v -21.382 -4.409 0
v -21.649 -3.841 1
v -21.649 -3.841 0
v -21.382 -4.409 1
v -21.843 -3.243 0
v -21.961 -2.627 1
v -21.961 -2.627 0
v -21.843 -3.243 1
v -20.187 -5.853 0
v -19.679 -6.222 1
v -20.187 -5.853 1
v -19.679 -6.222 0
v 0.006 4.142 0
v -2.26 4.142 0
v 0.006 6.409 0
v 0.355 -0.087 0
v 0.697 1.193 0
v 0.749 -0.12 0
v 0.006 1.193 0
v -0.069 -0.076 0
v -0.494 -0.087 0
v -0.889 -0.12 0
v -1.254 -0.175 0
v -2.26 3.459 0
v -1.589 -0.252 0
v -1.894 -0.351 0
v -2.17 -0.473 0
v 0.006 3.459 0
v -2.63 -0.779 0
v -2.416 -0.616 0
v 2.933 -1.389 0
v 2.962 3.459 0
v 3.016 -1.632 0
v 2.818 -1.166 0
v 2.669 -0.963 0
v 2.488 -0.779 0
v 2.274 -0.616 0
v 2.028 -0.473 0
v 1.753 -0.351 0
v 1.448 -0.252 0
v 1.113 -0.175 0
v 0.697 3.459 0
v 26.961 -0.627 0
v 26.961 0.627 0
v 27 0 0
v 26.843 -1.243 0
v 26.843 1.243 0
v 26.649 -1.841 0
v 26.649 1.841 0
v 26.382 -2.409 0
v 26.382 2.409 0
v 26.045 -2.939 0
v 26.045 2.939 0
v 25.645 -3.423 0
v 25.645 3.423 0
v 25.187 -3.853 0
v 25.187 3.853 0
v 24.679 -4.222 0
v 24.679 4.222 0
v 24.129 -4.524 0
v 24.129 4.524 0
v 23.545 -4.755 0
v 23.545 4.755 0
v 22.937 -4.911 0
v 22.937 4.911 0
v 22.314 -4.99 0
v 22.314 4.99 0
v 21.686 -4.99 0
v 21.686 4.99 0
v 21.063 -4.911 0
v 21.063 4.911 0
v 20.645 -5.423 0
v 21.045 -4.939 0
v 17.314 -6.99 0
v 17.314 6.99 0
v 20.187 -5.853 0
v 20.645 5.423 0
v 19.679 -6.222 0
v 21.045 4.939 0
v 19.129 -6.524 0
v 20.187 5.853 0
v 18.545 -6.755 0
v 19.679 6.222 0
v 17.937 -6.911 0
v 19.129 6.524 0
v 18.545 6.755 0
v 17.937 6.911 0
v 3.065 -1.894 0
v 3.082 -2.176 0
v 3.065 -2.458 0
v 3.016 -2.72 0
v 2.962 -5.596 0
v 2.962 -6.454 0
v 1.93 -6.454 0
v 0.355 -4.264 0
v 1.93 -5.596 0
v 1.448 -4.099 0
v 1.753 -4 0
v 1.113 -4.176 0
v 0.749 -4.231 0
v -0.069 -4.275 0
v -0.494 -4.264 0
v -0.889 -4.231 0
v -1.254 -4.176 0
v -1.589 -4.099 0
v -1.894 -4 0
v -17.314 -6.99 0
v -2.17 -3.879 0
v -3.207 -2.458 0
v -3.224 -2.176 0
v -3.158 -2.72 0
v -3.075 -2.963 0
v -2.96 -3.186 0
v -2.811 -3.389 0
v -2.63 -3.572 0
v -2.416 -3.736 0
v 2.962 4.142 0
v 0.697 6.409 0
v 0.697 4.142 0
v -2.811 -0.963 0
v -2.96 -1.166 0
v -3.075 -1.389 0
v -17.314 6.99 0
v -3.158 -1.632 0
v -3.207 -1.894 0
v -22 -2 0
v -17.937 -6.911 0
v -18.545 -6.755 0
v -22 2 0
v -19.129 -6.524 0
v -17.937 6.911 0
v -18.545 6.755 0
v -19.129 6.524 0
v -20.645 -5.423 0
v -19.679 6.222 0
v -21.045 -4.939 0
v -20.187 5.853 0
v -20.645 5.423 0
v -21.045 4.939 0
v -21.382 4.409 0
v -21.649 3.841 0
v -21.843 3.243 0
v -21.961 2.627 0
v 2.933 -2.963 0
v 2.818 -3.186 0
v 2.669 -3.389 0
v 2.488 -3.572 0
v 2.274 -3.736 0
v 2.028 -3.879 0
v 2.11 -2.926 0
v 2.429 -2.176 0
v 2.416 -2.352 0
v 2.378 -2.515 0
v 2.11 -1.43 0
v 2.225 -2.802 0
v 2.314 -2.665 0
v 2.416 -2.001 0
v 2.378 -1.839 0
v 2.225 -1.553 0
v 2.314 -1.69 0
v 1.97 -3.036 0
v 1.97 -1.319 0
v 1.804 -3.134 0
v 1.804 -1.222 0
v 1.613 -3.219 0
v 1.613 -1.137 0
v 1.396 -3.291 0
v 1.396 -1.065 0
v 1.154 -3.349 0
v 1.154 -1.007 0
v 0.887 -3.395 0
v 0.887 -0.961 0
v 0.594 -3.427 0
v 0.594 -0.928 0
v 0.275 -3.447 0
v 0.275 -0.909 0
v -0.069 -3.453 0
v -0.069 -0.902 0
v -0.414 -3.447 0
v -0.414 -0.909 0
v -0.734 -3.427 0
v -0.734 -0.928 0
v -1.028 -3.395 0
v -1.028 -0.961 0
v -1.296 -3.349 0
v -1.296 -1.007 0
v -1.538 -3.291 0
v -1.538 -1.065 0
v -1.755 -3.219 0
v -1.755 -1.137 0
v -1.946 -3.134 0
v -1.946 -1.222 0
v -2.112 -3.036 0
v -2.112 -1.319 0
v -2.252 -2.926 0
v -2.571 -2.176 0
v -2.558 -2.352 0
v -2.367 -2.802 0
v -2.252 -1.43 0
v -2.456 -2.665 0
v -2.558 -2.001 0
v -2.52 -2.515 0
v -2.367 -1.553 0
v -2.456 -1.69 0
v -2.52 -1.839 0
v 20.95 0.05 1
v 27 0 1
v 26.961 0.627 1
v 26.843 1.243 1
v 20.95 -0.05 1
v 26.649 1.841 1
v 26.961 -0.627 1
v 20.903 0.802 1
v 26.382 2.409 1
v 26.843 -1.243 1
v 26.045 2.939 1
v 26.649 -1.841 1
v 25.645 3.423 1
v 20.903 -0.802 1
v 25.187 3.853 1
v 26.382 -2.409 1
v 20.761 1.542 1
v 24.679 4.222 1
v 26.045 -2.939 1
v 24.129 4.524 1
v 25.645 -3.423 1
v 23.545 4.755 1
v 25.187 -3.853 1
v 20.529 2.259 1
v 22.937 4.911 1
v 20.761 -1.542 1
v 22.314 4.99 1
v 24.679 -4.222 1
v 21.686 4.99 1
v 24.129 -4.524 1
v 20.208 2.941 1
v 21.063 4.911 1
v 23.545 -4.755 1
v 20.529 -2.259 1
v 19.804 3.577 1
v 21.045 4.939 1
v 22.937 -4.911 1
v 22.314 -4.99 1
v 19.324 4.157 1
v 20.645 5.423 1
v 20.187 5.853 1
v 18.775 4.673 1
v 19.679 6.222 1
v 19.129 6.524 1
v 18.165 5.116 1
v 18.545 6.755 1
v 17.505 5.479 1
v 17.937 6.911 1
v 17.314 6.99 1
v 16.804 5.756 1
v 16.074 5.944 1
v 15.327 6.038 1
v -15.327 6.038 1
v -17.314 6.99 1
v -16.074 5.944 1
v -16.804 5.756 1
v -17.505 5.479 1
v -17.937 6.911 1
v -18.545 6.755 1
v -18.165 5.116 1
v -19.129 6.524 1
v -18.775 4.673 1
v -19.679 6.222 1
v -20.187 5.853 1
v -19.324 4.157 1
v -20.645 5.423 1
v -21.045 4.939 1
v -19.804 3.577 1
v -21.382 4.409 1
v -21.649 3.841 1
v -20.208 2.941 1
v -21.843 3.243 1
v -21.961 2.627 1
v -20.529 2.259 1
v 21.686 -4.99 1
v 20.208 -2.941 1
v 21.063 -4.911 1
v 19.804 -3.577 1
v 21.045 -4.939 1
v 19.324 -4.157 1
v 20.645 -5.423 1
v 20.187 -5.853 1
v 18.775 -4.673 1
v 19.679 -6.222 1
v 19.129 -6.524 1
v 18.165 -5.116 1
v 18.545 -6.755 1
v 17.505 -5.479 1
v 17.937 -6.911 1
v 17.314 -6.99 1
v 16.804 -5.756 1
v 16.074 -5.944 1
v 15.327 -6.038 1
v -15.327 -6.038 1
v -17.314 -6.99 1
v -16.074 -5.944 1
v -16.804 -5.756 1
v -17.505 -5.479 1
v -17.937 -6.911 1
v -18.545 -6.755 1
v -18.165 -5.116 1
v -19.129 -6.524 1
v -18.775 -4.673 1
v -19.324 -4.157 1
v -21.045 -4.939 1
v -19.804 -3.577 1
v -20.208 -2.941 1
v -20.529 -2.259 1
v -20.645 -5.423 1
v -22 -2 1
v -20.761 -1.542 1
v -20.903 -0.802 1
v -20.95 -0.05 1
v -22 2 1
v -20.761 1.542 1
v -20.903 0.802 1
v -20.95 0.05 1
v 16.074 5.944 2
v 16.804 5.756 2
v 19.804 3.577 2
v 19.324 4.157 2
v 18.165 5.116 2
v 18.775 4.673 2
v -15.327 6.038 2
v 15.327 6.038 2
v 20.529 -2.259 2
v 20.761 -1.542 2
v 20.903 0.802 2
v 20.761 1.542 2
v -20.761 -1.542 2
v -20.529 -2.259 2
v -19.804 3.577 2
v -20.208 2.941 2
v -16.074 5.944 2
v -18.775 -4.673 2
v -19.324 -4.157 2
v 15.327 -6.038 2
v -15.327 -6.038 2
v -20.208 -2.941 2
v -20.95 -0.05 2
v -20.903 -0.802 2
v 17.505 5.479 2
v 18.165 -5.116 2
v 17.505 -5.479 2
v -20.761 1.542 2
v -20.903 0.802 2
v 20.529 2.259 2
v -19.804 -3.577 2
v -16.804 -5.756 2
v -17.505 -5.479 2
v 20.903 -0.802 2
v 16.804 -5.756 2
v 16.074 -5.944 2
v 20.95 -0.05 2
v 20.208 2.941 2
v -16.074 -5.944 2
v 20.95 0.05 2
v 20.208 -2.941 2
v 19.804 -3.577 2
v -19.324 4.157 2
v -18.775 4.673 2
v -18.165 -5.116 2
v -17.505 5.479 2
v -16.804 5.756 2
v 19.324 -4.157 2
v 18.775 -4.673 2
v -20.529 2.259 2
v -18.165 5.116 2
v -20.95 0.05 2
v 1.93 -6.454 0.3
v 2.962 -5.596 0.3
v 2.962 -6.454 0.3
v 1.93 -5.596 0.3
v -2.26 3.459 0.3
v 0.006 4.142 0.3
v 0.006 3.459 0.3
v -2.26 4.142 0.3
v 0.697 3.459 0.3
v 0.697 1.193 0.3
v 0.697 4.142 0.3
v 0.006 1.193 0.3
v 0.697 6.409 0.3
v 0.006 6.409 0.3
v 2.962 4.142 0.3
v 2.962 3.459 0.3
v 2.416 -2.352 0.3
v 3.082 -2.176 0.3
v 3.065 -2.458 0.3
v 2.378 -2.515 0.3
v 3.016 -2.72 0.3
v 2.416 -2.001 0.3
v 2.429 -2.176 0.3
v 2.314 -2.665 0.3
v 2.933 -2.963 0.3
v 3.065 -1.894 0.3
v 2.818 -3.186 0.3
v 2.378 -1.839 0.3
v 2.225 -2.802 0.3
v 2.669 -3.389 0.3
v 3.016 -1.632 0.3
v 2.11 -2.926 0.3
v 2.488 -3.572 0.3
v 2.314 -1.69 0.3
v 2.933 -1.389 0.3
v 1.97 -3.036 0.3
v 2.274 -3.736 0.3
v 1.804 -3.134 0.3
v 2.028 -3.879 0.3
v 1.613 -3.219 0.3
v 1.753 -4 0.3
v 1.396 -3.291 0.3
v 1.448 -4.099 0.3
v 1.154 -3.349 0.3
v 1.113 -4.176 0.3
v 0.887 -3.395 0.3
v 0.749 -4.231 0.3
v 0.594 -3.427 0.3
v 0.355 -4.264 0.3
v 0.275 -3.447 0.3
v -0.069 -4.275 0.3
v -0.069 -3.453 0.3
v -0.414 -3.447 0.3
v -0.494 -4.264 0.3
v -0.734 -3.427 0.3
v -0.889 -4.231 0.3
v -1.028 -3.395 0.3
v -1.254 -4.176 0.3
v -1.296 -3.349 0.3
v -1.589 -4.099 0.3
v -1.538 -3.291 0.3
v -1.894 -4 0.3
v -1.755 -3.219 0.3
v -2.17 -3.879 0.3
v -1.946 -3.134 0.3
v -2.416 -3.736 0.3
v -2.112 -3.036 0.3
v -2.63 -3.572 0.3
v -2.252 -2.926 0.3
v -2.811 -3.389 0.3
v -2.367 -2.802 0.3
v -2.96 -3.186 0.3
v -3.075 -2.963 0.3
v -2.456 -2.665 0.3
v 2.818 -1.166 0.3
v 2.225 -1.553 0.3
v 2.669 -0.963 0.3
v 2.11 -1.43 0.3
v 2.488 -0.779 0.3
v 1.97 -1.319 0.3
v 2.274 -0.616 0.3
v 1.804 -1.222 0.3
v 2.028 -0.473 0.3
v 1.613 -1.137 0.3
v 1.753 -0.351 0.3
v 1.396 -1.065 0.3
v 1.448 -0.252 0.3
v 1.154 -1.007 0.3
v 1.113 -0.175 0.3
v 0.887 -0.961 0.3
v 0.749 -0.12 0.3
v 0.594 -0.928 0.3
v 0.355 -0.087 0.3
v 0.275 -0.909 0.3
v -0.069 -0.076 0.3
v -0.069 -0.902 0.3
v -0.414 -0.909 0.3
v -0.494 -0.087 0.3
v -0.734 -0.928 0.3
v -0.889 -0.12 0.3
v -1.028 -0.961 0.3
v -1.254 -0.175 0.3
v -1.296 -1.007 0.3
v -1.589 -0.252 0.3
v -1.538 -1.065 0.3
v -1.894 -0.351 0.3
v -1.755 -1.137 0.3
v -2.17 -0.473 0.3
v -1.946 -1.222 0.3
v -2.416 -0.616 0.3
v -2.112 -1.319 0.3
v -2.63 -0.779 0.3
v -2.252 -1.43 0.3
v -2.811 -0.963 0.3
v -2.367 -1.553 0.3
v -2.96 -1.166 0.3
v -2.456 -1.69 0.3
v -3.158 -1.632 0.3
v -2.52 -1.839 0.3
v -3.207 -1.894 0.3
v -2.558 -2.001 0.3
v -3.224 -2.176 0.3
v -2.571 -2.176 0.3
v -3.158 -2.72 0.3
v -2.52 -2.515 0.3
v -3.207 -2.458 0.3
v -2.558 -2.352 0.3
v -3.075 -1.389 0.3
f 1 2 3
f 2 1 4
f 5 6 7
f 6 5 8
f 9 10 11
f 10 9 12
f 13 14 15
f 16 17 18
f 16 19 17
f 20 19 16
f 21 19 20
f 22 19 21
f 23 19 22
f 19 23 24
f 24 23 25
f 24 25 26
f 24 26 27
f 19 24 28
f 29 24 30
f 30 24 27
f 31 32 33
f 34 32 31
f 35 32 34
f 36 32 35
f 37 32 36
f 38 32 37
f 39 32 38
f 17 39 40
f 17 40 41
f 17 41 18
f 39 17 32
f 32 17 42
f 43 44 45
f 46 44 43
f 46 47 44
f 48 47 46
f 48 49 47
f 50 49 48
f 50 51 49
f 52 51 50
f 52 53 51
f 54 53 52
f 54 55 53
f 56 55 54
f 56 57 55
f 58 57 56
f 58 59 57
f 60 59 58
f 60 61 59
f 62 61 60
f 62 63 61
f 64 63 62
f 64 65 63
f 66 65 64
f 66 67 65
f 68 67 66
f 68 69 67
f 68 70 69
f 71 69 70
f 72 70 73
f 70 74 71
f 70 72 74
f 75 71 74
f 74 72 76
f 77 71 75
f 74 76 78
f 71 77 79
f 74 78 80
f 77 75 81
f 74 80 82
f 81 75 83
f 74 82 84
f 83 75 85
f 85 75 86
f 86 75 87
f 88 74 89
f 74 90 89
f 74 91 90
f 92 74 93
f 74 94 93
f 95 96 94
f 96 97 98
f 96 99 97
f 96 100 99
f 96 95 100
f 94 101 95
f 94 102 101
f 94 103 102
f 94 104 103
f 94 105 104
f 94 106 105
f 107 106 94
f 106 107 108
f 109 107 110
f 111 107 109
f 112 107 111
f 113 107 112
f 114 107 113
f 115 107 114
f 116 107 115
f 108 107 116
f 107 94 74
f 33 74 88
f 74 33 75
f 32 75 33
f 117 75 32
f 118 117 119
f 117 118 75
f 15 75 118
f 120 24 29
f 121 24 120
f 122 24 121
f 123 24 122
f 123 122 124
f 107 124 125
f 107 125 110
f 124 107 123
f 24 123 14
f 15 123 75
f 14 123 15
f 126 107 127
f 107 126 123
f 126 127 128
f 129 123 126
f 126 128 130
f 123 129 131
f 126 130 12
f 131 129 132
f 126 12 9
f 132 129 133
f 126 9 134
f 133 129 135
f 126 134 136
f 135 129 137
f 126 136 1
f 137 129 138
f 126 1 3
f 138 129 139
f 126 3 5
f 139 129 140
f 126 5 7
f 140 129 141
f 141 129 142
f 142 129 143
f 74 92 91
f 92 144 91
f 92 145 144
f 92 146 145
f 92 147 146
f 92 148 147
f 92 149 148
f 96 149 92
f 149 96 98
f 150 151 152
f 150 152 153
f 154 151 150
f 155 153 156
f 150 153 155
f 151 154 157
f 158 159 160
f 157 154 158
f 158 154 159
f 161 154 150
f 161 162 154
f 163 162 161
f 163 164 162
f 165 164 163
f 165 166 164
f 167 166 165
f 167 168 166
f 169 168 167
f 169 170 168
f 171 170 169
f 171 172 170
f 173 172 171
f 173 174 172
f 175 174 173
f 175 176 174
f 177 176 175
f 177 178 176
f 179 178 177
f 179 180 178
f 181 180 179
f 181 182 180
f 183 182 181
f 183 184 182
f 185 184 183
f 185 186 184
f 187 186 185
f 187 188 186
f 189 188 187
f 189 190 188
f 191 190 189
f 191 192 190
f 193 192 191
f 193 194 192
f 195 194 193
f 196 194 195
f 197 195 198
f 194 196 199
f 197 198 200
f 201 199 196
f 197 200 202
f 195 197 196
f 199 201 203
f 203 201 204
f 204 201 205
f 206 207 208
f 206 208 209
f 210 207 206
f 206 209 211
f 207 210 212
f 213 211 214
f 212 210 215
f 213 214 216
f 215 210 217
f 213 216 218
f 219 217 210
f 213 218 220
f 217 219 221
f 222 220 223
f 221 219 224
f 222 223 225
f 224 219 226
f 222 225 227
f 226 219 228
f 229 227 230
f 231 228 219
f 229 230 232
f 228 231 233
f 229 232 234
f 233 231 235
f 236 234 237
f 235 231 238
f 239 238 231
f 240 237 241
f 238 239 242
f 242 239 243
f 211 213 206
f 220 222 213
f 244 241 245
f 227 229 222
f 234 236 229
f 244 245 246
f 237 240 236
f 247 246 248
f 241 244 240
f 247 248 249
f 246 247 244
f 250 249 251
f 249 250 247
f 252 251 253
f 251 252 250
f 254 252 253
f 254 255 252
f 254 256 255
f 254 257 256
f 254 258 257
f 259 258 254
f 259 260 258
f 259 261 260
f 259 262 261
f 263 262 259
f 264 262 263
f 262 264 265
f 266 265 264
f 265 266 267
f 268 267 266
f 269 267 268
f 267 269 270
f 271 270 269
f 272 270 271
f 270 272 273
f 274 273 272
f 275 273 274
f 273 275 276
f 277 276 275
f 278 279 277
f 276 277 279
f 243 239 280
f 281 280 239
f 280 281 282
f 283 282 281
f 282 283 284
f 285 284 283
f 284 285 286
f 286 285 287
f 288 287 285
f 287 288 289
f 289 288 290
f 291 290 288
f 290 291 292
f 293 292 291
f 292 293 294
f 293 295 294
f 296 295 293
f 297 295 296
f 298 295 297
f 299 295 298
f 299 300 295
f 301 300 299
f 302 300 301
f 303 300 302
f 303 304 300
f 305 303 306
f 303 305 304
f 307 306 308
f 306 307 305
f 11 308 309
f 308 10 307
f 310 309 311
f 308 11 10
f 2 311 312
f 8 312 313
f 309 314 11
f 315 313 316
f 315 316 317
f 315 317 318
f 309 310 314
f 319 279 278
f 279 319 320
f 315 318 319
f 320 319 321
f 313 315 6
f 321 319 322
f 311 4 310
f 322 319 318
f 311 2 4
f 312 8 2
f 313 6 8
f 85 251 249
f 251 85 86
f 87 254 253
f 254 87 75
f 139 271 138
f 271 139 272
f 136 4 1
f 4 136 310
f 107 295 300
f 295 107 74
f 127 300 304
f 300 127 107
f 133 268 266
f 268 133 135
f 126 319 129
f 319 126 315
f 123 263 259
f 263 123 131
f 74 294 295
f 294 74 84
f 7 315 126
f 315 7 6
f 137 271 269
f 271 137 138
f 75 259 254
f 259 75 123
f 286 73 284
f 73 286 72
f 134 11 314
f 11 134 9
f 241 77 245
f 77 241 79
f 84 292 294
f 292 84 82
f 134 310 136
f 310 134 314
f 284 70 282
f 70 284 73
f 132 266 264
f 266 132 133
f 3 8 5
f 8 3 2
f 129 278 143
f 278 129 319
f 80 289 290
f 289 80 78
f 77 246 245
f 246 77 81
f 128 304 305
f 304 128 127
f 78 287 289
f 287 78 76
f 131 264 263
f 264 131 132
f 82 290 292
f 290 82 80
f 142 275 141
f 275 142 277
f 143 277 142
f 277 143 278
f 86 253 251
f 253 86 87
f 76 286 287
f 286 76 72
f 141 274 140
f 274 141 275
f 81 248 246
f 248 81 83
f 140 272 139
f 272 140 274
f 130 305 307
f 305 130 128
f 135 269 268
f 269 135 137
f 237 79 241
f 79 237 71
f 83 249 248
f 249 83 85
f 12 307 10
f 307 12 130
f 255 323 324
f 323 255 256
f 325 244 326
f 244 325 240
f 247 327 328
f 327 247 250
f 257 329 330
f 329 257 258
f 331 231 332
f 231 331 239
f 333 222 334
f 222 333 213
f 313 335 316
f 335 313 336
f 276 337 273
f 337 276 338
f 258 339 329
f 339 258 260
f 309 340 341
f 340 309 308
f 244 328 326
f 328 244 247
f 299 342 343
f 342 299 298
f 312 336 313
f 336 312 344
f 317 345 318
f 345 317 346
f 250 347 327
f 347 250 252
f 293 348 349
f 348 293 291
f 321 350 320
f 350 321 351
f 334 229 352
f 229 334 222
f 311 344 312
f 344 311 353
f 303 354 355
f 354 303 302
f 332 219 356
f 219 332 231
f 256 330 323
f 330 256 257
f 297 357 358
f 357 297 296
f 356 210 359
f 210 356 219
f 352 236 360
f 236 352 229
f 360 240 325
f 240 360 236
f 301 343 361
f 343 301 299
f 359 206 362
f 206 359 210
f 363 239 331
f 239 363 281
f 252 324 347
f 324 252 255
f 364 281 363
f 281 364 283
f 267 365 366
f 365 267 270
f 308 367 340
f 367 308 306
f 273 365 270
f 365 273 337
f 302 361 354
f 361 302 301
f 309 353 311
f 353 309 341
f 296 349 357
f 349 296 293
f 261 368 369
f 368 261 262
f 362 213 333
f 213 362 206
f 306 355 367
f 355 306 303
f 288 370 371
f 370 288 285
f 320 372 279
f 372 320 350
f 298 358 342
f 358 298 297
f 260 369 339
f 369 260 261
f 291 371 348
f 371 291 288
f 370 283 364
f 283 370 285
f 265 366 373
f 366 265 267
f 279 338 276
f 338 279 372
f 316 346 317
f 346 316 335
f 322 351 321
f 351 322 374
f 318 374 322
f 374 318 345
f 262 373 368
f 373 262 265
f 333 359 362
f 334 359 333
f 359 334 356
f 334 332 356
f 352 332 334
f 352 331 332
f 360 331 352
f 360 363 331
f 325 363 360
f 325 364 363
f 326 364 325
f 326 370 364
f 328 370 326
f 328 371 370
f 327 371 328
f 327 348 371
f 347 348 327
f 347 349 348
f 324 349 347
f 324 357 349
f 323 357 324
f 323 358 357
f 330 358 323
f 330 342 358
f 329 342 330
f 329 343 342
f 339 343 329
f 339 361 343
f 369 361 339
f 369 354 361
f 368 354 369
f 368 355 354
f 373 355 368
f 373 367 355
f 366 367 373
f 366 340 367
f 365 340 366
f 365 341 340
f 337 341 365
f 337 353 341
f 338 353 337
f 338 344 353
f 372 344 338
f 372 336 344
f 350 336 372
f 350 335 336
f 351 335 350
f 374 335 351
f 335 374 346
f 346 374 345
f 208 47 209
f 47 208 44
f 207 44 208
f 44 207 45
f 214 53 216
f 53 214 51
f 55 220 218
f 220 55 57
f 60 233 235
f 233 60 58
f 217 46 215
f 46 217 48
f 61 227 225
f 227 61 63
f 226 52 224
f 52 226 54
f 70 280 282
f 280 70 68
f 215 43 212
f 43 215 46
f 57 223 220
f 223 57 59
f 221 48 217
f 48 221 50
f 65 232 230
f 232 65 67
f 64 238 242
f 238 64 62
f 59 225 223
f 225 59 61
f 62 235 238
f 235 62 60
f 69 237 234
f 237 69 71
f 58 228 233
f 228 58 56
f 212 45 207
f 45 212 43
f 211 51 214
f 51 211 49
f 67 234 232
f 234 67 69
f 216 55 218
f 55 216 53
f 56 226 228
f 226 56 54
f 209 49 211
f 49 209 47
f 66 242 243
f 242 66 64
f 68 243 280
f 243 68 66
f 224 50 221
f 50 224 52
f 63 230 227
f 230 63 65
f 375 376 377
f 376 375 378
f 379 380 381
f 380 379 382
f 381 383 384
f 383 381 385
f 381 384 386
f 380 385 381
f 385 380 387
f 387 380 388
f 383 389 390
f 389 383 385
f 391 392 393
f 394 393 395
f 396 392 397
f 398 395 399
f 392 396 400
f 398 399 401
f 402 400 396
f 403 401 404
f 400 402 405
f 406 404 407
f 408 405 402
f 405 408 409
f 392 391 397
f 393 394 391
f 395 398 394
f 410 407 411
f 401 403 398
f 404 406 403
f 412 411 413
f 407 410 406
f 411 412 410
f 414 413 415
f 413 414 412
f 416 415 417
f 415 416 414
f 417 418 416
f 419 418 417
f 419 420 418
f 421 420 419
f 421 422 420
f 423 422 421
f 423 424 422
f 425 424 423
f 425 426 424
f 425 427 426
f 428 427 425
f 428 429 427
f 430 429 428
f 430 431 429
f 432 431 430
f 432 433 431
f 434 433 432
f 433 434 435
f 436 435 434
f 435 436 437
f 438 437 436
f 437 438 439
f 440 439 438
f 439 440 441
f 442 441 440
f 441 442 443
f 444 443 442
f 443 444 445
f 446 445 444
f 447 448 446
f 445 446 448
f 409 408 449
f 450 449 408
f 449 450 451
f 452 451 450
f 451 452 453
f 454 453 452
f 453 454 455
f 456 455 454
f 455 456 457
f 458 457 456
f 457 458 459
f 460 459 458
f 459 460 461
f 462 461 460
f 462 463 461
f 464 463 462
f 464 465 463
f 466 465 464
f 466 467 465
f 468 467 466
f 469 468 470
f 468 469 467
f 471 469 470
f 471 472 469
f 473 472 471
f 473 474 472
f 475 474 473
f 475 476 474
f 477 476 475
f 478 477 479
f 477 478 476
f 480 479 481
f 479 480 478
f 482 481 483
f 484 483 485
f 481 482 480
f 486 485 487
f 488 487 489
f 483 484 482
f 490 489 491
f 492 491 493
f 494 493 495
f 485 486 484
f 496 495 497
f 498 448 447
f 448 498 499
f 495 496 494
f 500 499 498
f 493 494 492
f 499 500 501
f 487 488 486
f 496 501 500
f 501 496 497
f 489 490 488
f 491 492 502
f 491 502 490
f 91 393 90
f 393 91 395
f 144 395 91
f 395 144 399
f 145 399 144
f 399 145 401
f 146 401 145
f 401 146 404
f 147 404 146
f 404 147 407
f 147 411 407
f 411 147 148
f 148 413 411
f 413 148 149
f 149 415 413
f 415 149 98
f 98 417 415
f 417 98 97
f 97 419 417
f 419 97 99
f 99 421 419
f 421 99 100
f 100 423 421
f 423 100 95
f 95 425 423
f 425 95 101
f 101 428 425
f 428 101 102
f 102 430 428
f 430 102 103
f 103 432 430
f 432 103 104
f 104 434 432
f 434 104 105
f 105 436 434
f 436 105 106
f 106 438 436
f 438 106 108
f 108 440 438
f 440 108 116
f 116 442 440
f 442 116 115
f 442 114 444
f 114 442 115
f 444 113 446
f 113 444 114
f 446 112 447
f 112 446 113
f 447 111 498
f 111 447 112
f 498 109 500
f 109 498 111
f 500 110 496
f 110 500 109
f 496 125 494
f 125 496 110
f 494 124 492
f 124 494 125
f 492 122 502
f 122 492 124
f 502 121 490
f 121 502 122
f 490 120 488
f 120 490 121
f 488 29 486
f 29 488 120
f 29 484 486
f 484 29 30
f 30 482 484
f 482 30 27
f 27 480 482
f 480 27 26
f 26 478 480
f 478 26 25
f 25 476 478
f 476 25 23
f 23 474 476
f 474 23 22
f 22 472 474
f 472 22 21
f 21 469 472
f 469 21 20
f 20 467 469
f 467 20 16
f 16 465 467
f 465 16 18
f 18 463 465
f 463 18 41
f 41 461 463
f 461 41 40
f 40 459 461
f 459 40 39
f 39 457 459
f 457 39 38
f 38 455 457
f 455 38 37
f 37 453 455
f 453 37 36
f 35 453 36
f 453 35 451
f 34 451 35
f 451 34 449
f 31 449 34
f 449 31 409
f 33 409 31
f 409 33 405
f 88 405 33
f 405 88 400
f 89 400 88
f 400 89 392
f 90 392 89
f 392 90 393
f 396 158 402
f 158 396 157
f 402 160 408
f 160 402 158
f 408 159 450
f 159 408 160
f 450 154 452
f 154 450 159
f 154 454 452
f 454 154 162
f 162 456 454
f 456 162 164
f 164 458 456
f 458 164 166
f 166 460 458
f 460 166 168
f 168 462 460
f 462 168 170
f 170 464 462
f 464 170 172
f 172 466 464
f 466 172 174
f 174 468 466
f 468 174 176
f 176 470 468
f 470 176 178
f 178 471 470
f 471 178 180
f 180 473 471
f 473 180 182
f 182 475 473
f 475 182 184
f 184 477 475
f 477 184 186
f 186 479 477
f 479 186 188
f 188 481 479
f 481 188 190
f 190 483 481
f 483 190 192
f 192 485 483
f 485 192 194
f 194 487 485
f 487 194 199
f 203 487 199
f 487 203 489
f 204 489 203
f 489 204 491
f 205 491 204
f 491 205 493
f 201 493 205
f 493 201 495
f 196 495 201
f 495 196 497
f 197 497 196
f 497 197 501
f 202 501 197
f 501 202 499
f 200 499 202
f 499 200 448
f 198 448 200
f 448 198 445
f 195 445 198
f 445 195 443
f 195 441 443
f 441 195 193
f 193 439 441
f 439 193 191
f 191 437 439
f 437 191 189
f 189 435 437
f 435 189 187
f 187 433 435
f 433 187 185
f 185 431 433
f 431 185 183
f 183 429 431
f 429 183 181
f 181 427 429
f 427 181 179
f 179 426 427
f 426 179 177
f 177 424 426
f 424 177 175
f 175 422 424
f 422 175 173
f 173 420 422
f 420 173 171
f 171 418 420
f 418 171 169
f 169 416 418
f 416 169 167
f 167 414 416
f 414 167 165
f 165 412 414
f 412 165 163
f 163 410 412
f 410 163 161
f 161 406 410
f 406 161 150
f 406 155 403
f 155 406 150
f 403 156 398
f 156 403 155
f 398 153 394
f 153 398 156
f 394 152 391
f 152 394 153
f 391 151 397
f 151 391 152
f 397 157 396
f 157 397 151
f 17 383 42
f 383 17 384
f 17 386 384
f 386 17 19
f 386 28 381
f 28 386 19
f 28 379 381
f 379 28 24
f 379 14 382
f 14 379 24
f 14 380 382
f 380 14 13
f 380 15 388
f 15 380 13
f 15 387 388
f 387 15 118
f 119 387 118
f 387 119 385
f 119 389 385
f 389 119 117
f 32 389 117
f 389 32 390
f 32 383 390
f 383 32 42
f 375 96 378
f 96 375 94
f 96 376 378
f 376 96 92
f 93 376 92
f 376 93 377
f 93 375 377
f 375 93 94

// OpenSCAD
$fn = 50;


difference() {
	union() {
		translate(v = [0, 0, 0]) {
			rotate(a = [0, 0, 0]) {
				hull() {
					translate(v = [-17.0000000000, 2.0000000000, 0]) {
						rotate(a = [0, 0, 0]) {
							translate(v = [0, 0, 0]) {
								rotate(a = [0, 0, 0]) {
									cylinder(h = 1, r = 5);
								}
							}
						}
					}
					translate(v = [17.0000000000, 2.0000000000, 0]) {
						rotate(a = [0, 0, 0]) {
							translate(v = [0, 0, 0]) {
								rotate(a = [0, 0, 0]) {
									cylinder(h = 1, r = 5);
								}
							}
						}
					}
					translate(v = [-17.0000000000, -2.0000000000, 0]) {
						rotate(a = [0, 0, 0]) {
							translate(v = [0, 0, 0]) {
								rotate(a = [0, 0, 0]) {
									cylinder(h = 1, r = 5);
								}
							}
						}
					}
					translate(v = [17.0000000000, -2.0000000000, 0]) {
						rotate(a = [0, 0, 0]) {
							translate(v = [0, 0, 0]) {
								rotate(a = [0, 0, 0]) {
									cylinder(h = 1, r = 5);
								}
							}
						}
					}
				}
			}
		}
		translate(v = [0, 0, 0]) {
			rotate(a = [0, 0, 0]) {
				hull() {
					translate(v = [-14.9500000000, -0.0500000000, 0]) {
						rotate(a = [0, 0, 0]) {
							translate(v = [0, 0, 0]) {
								rotate(a = [0, 0, 0]) {
									cylinder(h = 2, r = 6);
								}
							}
						}
					}
					translate(v = [14.9500000000, -0.0500000000, 0]) {
						rotate(a = [0, 0, 0]) {
							translate(v = [0, 0, 0]) {
								rotate(a = [0, 0, 0]) {
									cylinder(h = 2, r = 6);
								}
							}
						}
					}
					translate(v = [-14.9500000000, 0.0500000000, 0]) {
						rotate(a = [0, 0, 0]) {
							translate(v = [0, 0, 0]) {
								rotate(a = [0, 0, 0]) {
									cylinder(h = 2, r = 6);
								}
							}
						}
					}
					translate(v = [14.9500000000, 0.0500000000, 0]) {
						rotate(a = [0, 0, 0]) {
							translate(v = [0, 0, 0]) {
								rotate(a = [0, 0, 0]) {
									cylinder(h = 2, r = 6);
								}
							}
						}
					}
				}
			}
		}
		translate(v = [22.0000000000, 0, 0.0000000000]) {
			rotate(a = [0, 0, 0]) {
				cylinder(h = 1, r = 5);
			}
		}
	}
	union() {
		translate(v = [0, 0, 0.3000000000]) {
			rotate(a = [0, 180, 90]) {
				linear_extrude(height = 0.3000000000) {
					text(font = "Candara:Light", halign = "center", size = 6, text = "3+0.1", valign = "center");
				}
			}
		}
	}
}
